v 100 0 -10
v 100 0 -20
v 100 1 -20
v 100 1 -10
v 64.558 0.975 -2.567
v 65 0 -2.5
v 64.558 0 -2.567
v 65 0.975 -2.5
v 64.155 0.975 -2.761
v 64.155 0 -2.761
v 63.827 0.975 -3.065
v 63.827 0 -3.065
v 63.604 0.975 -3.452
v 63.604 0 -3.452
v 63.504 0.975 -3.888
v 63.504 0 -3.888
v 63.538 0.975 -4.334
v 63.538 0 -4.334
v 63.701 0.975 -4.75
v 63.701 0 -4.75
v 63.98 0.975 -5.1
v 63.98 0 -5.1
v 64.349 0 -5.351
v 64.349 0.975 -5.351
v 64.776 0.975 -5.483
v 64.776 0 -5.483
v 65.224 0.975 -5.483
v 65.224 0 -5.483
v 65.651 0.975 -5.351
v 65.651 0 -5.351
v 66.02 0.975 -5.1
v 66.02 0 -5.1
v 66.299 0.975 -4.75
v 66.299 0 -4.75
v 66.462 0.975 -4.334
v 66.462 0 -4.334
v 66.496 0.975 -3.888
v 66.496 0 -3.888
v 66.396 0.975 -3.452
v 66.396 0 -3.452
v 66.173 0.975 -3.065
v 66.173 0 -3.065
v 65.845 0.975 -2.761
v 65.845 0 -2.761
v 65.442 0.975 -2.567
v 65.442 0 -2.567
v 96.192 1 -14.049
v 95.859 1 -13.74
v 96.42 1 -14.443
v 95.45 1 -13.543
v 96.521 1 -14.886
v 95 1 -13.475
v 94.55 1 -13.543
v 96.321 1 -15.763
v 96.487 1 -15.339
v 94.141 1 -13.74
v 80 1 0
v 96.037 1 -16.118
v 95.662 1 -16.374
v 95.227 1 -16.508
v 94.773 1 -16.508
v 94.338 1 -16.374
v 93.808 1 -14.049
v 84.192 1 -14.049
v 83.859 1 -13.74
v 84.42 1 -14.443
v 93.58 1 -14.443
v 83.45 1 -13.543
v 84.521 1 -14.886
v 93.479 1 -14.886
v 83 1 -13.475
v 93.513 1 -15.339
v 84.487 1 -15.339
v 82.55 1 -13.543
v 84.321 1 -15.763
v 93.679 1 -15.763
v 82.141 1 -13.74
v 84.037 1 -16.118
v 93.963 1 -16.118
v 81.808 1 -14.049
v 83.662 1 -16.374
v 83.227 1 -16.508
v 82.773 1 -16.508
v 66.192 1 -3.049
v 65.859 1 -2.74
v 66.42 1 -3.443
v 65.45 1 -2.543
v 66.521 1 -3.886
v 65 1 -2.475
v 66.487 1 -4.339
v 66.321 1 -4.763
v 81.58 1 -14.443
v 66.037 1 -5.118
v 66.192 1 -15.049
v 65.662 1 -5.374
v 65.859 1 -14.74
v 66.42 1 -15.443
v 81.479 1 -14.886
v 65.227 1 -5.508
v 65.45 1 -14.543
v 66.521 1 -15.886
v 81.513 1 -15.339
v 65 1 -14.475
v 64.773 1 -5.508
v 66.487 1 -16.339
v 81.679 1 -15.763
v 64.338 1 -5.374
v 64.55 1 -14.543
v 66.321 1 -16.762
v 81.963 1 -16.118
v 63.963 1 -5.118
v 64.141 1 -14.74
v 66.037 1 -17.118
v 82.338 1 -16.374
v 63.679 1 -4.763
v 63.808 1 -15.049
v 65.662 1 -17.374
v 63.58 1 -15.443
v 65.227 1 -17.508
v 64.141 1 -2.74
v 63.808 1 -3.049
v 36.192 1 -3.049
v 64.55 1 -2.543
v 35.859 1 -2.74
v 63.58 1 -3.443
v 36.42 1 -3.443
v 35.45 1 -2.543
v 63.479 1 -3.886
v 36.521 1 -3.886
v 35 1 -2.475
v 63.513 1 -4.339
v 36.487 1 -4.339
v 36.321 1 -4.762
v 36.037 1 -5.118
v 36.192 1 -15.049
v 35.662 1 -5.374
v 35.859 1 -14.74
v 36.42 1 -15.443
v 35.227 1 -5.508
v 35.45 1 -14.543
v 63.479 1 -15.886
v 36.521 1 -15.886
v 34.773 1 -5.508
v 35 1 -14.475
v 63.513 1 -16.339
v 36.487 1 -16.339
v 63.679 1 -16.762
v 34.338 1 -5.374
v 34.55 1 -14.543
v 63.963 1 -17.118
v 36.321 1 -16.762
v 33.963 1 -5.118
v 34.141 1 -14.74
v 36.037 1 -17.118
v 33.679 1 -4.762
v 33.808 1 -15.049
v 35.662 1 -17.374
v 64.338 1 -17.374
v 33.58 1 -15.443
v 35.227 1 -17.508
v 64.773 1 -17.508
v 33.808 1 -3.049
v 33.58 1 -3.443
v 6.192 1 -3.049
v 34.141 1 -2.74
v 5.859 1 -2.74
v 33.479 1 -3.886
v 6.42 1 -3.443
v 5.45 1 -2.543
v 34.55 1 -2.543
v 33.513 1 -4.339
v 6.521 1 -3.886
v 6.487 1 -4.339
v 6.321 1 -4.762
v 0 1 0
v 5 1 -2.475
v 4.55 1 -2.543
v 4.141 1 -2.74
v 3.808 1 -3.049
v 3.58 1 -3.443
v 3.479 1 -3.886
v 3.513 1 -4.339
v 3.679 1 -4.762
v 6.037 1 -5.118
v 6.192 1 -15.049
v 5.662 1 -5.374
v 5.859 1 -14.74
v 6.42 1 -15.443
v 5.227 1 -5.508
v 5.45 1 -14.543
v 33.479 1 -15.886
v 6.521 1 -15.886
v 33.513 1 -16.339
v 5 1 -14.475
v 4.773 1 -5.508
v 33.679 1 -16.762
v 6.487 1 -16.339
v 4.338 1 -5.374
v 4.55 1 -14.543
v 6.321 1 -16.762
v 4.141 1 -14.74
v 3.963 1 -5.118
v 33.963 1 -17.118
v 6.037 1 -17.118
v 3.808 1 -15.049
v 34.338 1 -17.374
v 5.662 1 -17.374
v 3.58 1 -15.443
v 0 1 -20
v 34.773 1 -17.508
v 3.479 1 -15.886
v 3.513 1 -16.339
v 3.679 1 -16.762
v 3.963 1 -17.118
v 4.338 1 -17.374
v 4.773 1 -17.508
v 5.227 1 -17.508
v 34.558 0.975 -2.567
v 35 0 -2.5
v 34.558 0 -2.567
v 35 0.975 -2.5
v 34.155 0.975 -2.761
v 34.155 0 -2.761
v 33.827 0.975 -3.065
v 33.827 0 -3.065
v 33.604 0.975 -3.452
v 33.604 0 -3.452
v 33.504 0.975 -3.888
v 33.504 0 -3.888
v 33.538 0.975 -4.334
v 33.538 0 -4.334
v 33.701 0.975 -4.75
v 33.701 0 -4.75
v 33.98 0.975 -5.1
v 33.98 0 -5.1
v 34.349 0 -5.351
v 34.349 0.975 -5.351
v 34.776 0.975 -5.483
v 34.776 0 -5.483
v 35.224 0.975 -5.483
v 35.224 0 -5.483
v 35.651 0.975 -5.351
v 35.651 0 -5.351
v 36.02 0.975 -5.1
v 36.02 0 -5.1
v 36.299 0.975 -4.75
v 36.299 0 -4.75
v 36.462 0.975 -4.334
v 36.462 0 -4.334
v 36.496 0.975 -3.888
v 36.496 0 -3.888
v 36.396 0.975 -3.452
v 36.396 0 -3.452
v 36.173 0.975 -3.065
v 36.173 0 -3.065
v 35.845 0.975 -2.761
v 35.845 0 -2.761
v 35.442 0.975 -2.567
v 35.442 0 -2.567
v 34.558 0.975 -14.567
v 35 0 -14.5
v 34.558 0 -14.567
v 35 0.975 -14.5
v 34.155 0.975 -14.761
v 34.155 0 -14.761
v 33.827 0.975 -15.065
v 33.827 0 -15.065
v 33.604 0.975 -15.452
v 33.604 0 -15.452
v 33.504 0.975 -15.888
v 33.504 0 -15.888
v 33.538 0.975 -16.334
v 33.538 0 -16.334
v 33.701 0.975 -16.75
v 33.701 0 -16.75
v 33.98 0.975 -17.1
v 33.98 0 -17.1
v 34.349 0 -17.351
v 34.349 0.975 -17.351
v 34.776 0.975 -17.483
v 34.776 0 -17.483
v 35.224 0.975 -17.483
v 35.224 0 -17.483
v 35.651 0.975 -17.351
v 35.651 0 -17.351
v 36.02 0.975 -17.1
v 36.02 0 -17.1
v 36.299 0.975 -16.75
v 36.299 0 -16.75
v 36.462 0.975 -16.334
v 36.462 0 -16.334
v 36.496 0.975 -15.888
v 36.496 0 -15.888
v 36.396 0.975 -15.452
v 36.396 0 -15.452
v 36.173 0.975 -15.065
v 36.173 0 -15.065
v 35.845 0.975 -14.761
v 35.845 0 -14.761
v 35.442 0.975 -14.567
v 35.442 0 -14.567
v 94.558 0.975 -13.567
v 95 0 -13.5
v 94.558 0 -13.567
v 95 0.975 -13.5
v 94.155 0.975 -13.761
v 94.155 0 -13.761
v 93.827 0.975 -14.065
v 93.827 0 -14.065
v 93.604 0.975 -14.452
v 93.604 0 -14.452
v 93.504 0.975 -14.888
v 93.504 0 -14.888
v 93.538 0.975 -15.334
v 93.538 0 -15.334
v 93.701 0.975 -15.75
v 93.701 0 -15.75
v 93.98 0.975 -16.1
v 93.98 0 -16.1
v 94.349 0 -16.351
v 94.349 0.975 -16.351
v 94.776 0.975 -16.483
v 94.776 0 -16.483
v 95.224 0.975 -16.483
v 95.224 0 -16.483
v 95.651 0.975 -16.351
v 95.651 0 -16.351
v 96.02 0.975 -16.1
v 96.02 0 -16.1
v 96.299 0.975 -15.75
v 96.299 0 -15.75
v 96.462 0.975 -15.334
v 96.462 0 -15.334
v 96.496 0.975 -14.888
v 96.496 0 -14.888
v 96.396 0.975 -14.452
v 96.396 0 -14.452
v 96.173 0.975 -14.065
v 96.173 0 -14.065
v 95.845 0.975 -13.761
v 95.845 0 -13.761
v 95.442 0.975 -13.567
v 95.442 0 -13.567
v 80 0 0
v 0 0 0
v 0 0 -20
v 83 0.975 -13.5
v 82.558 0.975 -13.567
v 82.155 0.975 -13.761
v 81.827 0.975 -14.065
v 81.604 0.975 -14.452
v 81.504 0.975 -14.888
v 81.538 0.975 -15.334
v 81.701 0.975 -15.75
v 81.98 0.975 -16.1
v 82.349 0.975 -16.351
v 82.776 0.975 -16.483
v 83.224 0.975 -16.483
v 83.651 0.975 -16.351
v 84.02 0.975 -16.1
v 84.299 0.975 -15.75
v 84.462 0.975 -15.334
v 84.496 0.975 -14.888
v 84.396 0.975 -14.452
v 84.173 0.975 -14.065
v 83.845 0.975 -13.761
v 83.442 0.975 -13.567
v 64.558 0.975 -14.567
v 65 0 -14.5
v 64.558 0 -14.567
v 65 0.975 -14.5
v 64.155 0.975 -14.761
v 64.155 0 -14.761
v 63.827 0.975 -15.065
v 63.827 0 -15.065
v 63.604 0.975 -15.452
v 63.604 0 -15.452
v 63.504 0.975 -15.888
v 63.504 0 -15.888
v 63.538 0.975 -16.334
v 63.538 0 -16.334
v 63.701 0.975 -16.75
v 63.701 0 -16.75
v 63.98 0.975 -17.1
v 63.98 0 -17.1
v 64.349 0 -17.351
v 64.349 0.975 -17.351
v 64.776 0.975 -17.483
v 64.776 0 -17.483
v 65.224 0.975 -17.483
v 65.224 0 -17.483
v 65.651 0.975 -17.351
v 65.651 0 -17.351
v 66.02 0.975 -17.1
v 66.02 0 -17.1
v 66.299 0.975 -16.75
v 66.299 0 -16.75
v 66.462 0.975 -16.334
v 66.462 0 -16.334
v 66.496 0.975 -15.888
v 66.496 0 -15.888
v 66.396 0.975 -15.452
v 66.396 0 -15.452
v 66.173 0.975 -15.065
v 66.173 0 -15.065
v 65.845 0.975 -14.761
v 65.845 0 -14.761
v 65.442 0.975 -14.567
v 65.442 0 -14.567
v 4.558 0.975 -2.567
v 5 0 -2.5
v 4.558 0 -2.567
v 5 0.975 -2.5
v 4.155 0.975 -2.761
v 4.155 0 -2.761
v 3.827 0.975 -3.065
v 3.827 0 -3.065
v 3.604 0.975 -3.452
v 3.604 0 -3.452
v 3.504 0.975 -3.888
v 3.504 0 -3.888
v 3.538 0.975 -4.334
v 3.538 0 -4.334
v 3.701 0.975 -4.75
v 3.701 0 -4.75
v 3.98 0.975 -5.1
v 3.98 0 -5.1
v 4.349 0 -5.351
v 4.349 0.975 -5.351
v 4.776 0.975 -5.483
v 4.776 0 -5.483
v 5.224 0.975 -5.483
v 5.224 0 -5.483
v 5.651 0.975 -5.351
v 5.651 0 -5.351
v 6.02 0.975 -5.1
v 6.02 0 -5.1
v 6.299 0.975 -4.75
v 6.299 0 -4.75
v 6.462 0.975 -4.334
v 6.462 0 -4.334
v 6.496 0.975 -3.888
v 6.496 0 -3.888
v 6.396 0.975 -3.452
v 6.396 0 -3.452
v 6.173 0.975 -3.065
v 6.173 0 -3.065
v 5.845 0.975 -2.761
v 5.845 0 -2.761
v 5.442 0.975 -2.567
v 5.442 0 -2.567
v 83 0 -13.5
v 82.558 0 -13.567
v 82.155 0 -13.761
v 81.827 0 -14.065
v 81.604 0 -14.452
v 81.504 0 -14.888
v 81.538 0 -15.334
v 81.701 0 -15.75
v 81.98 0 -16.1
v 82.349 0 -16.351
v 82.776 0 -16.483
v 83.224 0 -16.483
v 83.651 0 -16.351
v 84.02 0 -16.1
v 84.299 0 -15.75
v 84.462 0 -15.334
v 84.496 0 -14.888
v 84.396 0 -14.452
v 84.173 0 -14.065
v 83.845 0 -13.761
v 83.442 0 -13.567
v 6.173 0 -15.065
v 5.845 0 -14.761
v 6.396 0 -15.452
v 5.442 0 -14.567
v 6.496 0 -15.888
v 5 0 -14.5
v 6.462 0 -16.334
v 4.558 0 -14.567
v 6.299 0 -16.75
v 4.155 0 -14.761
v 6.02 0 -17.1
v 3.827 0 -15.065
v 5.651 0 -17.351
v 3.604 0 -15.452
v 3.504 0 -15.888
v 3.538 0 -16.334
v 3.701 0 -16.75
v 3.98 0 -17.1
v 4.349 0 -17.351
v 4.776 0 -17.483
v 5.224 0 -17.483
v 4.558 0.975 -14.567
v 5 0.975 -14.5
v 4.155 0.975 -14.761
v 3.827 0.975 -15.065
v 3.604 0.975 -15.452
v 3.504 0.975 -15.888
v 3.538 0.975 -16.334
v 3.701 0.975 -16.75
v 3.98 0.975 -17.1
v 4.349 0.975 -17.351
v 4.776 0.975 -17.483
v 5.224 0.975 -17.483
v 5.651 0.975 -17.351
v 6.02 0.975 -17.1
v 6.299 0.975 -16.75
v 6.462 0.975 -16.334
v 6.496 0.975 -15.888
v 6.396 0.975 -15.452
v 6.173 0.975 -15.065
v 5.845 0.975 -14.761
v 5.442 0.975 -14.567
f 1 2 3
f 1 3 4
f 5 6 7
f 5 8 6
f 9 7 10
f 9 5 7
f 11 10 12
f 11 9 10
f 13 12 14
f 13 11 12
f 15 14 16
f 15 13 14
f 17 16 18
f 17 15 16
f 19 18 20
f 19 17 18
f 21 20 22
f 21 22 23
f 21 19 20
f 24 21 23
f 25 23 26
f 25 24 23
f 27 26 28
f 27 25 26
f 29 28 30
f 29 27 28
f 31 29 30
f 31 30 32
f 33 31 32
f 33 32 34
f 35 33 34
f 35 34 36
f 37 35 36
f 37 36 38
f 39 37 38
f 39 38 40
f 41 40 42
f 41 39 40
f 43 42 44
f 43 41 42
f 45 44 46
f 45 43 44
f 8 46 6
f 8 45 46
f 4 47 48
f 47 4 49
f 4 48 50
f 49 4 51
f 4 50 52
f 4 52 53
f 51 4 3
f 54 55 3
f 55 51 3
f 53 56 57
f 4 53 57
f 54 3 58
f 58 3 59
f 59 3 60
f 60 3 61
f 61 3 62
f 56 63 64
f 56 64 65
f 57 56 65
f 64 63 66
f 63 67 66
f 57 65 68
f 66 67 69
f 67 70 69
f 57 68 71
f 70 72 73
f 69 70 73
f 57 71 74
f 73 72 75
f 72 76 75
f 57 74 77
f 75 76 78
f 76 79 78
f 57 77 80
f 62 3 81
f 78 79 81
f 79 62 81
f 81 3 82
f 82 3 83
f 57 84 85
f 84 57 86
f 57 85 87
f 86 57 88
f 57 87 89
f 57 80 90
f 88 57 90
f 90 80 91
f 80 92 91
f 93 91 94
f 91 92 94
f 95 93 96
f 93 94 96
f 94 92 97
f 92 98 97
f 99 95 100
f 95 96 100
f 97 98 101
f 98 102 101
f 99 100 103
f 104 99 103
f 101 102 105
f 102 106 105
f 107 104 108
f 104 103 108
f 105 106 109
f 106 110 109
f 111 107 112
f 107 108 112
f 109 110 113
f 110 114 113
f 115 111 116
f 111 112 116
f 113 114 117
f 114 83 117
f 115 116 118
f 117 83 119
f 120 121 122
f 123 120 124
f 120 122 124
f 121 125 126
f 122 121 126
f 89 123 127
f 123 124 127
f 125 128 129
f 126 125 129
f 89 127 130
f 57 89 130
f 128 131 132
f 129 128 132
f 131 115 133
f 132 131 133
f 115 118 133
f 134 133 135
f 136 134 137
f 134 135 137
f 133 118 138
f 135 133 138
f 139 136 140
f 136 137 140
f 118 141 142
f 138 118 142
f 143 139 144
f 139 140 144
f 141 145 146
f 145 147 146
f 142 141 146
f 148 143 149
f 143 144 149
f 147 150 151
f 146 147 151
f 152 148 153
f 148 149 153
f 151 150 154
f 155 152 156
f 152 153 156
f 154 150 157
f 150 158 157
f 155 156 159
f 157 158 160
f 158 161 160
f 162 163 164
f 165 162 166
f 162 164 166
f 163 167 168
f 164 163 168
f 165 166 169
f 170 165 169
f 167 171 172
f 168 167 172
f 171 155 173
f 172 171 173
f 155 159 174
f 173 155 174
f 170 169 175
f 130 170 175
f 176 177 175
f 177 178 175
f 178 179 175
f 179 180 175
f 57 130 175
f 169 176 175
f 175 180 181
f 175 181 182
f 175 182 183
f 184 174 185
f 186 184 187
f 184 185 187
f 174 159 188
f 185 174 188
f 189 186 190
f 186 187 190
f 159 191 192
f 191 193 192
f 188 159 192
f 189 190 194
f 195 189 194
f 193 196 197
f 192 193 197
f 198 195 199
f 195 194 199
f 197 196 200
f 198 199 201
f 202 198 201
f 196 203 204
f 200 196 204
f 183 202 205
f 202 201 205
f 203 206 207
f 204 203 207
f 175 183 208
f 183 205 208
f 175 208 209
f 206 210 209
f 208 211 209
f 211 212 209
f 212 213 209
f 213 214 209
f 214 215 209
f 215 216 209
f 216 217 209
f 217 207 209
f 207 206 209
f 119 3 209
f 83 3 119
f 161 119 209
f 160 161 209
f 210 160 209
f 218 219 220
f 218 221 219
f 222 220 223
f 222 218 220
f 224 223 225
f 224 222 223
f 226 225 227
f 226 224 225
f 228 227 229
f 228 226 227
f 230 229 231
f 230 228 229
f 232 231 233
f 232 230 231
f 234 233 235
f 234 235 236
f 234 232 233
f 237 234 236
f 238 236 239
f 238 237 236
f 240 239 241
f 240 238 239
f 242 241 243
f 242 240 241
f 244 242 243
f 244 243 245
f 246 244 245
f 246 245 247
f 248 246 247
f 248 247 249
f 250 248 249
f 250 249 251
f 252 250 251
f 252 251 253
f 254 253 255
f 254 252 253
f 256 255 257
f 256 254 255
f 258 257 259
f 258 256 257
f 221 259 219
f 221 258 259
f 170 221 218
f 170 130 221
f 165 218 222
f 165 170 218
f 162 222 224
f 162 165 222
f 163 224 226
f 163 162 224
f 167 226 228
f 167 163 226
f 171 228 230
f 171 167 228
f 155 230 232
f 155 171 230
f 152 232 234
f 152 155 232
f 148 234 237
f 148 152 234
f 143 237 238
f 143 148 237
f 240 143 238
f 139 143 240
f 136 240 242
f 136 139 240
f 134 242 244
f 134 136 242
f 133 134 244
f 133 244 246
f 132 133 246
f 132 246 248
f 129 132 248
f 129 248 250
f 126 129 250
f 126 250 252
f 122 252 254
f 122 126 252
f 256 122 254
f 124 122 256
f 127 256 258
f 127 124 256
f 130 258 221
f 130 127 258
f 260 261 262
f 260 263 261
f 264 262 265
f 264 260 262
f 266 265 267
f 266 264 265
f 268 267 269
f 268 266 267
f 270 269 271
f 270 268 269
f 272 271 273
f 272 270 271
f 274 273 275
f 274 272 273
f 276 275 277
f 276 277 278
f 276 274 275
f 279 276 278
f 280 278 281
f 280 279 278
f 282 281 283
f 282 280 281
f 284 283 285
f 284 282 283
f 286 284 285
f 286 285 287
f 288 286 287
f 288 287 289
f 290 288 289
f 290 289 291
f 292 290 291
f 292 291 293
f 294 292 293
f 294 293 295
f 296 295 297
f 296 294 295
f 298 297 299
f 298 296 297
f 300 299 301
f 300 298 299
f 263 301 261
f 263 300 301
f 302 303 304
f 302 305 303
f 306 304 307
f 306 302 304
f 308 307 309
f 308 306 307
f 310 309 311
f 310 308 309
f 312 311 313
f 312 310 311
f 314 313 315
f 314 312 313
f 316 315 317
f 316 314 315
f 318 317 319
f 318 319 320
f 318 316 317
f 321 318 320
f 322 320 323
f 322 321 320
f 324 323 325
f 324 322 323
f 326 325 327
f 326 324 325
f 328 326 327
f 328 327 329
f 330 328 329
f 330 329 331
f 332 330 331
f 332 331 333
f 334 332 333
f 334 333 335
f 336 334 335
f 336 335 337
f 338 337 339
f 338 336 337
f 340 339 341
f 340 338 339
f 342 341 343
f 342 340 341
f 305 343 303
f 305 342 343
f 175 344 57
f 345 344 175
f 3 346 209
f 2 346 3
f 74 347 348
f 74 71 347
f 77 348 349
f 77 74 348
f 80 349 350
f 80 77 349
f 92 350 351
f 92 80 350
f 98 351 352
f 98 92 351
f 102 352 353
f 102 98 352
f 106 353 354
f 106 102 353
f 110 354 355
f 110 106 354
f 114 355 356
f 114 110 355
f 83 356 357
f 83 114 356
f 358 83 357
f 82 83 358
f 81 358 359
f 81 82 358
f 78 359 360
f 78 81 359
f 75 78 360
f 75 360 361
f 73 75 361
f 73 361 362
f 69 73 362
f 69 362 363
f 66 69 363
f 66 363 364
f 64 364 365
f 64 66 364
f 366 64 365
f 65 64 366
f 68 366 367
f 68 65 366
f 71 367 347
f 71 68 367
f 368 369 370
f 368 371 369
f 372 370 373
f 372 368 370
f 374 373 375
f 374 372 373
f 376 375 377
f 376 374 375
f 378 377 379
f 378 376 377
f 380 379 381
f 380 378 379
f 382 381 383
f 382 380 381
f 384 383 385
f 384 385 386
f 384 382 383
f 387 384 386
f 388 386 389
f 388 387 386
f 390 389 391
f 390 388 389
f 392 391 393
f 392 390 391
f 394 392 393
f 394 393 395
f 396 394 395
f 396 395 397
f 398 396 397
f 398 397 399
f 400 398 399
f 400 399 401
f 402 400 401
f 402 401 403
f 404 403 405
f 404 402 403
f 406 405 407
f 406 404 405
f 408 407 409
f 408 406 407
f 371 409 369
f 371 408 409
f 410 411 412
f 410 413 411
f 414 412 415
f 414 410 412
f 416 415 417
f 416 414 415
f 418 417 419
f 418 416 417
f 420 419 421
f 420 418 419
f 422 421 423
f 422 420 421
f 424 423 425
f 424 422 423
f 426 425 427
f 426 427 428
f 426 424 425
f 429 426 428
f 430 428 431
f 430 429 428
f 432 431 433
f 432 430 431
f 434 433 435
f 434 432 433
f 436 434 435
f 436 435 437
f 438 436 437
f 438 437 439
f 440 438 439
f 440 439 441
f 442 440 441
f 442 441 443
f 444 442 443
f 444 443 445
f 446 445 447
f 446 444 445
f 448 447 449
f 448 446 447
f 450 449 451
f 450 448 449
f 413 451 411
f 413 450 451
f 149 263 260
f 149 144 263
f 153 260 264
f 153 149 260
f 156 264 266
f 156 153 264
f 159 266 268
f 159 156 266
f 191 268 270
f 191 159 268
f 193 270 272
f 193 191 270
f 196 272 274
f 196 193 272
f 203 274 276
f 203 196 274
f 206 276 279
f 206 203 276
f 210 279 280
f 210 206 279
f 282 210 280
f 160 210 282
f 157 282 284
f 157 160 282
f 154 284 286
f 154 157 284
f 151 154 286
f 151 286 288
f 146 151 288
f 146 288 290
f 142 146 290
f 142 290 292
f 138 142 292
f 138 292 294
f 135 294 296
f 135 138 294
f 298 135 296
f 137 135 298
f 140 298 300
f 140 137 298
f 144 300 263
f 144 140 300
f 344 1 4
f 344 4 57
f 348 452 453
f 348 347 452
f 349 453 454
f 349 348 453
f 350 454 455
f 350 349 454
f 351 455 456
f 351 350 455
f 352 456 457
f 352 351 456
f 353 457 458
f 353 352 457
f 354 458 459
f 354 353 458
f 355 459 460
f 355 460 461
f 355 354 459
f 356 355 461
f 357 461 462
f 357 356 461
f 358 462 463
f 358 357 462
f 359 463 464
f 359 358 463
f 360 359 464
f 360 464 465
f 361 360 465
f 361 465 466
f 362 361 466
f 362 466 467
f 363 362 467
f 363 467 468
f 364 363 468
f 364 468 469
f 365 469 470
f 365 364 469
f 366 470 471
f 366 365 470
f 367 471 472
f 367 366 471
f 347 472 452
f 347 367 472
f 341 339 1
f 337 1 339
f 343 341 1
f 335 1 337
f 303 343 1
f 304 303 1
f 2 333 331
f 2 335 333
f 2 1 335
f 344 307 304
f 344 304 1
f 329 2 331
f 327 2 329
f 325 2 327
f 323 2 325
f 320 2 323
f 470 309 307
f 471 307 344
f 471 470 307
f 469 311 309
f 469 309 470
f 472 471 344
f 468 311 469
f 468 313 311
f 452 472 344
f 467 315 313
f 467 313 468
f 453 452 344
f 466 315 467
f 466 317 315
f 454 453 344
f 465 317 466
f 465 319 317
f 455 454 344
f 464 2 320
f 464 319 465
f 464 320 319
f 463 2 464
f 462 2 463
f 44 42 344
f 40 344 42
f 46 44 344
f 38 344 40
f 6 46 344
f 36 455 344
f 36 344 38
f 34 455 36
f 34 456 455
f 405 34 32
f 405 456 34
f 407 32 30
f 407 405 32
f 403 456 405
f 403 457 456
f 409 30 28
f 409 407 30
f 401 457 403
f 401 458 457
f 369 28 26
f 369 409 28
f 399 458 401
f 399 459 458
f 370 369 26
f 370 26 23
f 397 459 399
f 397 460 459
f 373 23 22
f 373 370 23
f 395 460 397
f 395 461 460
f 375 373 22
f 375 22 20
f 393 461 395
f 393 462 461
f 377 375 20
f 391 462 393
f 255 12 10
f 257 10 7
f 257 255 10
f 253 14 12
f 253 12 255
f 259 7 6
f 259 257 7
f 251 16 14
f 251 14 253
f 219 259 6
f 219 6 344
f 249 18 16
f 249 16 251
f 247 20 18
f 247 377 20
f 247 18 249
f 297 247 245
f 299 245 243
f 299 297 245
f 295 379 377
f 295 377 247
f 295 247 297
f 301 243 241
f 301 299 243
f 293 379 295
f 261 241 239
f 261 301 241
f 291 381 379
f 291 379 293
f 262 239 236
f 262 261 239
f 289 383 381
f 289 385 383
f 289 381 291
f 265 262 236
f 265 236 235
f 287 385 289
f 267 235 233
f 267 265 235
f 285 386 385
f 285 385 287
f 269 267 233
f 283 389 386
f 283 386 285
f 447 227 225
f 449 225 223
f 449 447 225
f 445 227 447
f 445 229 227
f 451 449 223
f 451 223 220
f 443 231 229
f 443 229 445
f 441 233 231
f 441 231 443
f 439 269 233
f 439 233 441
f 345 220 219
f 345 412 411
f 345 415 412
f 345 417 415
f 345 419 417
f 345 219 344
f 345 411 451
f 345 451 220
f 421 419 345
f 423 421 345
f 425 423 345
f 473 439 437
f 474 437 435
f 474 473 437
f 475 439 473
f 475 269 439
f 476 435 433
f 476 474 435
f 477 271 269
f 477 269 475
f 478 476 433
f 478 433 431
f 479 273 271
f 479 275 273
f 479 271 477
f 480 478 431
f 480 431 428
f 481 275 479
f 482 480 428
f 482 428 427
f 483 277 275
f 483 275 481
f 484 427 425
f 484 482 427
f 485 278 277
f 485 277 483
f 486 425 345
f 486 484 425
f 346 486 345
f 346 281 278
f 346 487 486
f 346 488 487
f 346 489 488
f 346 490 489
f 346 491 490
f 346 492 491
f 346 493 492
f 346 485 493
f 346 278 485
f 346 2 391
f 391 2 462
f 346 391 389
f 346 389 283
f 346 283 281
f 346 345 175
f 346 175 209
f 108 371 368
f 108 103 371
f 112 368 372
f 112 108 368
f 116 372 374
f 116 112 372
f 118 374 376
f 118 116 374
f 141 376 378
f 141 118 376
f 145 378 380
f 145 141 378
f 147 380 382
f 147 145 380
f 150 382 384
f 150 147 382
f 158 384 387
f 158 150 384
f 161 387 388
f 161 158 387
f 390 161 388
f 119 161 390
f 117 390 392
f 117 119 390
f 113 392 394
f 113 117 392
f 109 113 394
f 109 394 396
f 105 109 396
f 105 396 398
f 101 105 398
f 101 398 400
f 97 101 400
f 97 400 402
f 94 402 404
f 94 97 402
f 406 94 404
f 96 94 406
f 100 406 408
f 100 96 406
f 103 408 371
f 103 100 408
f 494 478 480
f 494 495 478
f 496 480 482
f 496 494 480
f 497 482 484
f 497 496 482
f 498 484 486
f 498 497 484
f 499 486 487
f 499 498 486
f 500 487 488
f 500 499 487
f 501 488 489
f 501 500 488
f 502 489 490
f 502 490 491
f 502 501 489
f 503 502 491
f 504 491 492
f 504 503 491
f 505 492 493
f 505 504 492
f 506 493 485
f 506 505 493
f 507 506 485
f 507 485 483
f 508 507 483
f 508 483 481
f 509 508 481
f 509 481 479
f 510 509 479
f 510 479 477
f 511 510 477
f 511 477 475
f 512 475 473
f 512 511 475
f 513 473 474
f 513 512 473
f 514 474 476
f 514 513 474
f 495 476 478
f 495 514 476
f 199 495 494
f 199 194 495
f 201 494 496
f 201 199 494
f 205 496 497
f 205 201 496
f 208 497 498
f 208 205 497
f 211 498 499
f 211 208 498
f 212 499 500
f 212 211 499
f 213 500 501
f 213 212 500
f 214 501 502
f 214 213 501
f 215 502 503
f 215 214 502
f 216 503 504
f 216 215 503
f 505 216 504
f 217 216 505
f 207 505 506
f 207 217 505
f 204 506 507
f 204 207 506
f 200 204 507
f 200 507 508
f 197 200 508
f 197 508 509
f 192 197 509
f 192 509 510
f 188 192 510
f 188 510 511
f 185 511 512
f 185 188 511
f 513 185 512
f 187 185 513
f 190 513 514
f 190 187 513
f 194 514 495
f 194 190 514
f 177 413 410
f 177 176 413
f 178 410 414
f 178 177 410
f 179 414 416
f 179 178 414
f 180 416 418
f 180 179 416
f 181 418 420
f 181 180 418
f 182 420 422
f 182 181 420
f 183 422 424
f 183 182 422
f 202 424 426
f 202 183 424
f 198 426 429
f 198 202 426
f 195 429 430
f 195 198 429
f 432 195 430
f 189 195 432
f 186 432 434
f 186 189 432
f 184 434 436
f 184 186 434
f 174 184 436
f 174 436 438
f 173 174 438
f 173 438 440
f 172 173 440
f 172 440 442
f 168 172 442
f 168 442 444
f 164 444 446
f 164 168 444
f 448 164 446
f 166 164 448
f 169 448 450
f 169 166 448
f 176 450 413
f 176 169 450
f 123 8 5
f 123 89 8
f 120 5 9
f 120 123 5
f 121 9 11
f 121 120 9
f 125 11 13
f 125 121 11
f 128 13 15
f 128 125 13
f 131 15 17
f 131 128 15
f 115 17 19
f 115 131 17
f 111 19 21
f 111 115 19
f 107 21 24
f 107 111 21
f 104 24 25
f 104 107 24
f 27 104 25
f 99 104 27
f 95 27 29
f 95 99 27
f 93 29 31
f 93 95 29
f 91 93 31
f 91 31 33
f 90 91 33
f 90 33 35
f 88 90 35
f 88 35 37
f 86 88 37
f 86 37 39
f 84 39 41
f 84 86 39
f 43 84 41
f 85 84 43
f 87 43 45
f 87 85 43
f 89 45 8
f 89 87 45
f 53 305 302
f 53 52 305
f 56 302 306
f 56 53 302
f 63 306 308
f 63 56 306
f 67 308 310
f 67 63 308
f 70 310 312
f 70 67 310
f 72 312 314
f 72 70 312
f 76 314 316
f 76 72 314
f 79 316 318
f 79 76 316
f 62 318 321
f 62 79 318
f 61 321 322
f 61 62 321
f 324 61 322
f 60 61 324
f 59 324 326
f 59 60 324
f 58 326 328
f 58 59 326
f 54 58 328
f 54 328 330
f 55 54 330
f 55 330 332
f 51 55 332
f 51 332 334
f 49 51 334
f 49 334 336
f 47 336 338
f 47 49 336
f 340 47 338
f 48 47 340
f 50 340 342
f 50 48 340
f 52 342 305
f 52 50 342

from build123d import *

# Parameters (mm, degrees)
EXTRUDE_1_DEPTH      = 1
F_3_0MM_1_AT_2_COUNT = 2
F_3_0MM_1_AT_2_PITCH = 12
F_3_0MM_1_AT_3_COUNT = 2
F_3_0MM_1_AT_3_PITCH = 30
F_3_0MM_1_AT_4_COUNT = 2
F_3_0MM_1_AT_4_PITCH = 60
F_3_0MM_1_AT_5_COUNT = 2
F_3_0MM_1_AT_5_PITCH = 32.310988843
F_3_0MM_1_AT_6_COUNT = 2
F_3_0MM_1_AT_6_PITCH = 61.188234163
F_3_0MM_1_AT_7_COUNT = 2
F_3_0MM_1_AT_7_PITCH = 78.006409993
F_3_0MM_1_AT_8_COUNT = 2
F_3_0MM_1_AT_8_PITCH = 90.005555384


with BuildPart() as part:
    # 草图1 → 凸台-拉伸1 (new body)
    with BuildSketch(Plane(origin=(0, 0, 0), x_dir=(1, 0, 0), z_dir=(0, 1, 0))):
        Polygon((100, 10), (80, 0), (0, 0), (0, 20), (100, 20), align=None)
    extrude(amount=EXTRUDE_1_DEPTH)

    # 草图3 → Ø3.0mm 暗销孔1 (revolve, cut)
    with BuildSketch(Plane(origin=(5, 1, -16), x_dir=(0, 0, 1), z_dir=(1, 0, 0))):
        Polygon((0, 0), (0, 1), (1.5, 1), (1.5, 0.025), (1.525, 0), align=None)
    f_3_0mm_1 = revolve(axis=Axis((5, 7.35, -16), (0, -1, 0)), mode=Mode.SUBTRACT)

    # Ø3.0mm 暗销孔1 at 2: Ø3.0mm 暗销孔1 ×2
    with Locations(*[(0, 0, i * F_3_0MM_1_AT_2_PITCH) for i in range(1, F_3_0MM_1_AT_2_COUNT)]):
        add(f_3_0mm_1, mode=Mode.SUBTRACT)

    # Ø3.0mm 暗销孔1 at 3: Ø3.0mm 暗销孔1 ×2
    with Locations(*[(i * F_3_0MM_1_AT_3_PITCH, 0, 0) for i in range(1, F_3_0MM_1_AT_3_COUNT)]):
        add(f_3_0mm_1, mode=Mode.SUBTRACT)

    # Ø3.0mm 暗销孔1 at 4: Ø3.0mm 暗销孔1 ×2
    with Locations(*[(i * F_3_0MM_1_AT_4_PITCH, 0, 0) for i in range(1, F_3_0MM_1_AT_4_COUNT)]):
        add(f_3_0mm_1, mode=Mode.SUBTRACT)

    # Ø3.0mm 暗销孔1 at 5: Ø3.0mm 暗销孔1 ×2
    with Locations(*[Vector(0.9284766908852593, 0, 0.37139067635410383) * (i * F_3_0MM_1_AT_5_PITCH) for i in range(1, F_3_0MM_1_AT_5_COUNT)]):
        add(f_3_0mm_1, mode=Mode.SUBTRACT)

    # Ø3.0mm 暗销孔1 at 6: Ø3.0mm 暗销孔1 ×2
    with Locations(*[Vector(0.9805806756909202, 0, 0.19611613513818404) * (i * F_3_0MM_1_AT_6_PITCH) for i in range(1, F_3_0MM_1_AT_6_COUNT)]):
        add(f_3_0mm_1, mode=Mode.SUBTRACT)

    # Ø3.0mm 暗销孔1 at 7: Ø3.0mm 暗销孔1 ×2
    with Locations(*[Vector(0.9999178273551348, 0, 0.01281945932506583) * (i * F_3_0MM_1_AT_7_PITCH) for i in range(1, F_3_0MM_1_AT_7_COUNT)]):
        add(f_3_0mm_1, mode=Mode.SUBTRACT)

    # Ø3.0mm 暗销孔1 at 8: Ø3.0mm 暗销孔1 ×2
    with Locations(*[Vector(0.9999382773199424, 0, 0.011110425303554916) * (i * F_3_0MM_1_AT_8_PITCH) for i in range(1, F_3_0MM_1_AT_8_COUNT)]):
        add(f_3_0mm_1, mode=Mode.SUBTRACT)


solid = part.part
